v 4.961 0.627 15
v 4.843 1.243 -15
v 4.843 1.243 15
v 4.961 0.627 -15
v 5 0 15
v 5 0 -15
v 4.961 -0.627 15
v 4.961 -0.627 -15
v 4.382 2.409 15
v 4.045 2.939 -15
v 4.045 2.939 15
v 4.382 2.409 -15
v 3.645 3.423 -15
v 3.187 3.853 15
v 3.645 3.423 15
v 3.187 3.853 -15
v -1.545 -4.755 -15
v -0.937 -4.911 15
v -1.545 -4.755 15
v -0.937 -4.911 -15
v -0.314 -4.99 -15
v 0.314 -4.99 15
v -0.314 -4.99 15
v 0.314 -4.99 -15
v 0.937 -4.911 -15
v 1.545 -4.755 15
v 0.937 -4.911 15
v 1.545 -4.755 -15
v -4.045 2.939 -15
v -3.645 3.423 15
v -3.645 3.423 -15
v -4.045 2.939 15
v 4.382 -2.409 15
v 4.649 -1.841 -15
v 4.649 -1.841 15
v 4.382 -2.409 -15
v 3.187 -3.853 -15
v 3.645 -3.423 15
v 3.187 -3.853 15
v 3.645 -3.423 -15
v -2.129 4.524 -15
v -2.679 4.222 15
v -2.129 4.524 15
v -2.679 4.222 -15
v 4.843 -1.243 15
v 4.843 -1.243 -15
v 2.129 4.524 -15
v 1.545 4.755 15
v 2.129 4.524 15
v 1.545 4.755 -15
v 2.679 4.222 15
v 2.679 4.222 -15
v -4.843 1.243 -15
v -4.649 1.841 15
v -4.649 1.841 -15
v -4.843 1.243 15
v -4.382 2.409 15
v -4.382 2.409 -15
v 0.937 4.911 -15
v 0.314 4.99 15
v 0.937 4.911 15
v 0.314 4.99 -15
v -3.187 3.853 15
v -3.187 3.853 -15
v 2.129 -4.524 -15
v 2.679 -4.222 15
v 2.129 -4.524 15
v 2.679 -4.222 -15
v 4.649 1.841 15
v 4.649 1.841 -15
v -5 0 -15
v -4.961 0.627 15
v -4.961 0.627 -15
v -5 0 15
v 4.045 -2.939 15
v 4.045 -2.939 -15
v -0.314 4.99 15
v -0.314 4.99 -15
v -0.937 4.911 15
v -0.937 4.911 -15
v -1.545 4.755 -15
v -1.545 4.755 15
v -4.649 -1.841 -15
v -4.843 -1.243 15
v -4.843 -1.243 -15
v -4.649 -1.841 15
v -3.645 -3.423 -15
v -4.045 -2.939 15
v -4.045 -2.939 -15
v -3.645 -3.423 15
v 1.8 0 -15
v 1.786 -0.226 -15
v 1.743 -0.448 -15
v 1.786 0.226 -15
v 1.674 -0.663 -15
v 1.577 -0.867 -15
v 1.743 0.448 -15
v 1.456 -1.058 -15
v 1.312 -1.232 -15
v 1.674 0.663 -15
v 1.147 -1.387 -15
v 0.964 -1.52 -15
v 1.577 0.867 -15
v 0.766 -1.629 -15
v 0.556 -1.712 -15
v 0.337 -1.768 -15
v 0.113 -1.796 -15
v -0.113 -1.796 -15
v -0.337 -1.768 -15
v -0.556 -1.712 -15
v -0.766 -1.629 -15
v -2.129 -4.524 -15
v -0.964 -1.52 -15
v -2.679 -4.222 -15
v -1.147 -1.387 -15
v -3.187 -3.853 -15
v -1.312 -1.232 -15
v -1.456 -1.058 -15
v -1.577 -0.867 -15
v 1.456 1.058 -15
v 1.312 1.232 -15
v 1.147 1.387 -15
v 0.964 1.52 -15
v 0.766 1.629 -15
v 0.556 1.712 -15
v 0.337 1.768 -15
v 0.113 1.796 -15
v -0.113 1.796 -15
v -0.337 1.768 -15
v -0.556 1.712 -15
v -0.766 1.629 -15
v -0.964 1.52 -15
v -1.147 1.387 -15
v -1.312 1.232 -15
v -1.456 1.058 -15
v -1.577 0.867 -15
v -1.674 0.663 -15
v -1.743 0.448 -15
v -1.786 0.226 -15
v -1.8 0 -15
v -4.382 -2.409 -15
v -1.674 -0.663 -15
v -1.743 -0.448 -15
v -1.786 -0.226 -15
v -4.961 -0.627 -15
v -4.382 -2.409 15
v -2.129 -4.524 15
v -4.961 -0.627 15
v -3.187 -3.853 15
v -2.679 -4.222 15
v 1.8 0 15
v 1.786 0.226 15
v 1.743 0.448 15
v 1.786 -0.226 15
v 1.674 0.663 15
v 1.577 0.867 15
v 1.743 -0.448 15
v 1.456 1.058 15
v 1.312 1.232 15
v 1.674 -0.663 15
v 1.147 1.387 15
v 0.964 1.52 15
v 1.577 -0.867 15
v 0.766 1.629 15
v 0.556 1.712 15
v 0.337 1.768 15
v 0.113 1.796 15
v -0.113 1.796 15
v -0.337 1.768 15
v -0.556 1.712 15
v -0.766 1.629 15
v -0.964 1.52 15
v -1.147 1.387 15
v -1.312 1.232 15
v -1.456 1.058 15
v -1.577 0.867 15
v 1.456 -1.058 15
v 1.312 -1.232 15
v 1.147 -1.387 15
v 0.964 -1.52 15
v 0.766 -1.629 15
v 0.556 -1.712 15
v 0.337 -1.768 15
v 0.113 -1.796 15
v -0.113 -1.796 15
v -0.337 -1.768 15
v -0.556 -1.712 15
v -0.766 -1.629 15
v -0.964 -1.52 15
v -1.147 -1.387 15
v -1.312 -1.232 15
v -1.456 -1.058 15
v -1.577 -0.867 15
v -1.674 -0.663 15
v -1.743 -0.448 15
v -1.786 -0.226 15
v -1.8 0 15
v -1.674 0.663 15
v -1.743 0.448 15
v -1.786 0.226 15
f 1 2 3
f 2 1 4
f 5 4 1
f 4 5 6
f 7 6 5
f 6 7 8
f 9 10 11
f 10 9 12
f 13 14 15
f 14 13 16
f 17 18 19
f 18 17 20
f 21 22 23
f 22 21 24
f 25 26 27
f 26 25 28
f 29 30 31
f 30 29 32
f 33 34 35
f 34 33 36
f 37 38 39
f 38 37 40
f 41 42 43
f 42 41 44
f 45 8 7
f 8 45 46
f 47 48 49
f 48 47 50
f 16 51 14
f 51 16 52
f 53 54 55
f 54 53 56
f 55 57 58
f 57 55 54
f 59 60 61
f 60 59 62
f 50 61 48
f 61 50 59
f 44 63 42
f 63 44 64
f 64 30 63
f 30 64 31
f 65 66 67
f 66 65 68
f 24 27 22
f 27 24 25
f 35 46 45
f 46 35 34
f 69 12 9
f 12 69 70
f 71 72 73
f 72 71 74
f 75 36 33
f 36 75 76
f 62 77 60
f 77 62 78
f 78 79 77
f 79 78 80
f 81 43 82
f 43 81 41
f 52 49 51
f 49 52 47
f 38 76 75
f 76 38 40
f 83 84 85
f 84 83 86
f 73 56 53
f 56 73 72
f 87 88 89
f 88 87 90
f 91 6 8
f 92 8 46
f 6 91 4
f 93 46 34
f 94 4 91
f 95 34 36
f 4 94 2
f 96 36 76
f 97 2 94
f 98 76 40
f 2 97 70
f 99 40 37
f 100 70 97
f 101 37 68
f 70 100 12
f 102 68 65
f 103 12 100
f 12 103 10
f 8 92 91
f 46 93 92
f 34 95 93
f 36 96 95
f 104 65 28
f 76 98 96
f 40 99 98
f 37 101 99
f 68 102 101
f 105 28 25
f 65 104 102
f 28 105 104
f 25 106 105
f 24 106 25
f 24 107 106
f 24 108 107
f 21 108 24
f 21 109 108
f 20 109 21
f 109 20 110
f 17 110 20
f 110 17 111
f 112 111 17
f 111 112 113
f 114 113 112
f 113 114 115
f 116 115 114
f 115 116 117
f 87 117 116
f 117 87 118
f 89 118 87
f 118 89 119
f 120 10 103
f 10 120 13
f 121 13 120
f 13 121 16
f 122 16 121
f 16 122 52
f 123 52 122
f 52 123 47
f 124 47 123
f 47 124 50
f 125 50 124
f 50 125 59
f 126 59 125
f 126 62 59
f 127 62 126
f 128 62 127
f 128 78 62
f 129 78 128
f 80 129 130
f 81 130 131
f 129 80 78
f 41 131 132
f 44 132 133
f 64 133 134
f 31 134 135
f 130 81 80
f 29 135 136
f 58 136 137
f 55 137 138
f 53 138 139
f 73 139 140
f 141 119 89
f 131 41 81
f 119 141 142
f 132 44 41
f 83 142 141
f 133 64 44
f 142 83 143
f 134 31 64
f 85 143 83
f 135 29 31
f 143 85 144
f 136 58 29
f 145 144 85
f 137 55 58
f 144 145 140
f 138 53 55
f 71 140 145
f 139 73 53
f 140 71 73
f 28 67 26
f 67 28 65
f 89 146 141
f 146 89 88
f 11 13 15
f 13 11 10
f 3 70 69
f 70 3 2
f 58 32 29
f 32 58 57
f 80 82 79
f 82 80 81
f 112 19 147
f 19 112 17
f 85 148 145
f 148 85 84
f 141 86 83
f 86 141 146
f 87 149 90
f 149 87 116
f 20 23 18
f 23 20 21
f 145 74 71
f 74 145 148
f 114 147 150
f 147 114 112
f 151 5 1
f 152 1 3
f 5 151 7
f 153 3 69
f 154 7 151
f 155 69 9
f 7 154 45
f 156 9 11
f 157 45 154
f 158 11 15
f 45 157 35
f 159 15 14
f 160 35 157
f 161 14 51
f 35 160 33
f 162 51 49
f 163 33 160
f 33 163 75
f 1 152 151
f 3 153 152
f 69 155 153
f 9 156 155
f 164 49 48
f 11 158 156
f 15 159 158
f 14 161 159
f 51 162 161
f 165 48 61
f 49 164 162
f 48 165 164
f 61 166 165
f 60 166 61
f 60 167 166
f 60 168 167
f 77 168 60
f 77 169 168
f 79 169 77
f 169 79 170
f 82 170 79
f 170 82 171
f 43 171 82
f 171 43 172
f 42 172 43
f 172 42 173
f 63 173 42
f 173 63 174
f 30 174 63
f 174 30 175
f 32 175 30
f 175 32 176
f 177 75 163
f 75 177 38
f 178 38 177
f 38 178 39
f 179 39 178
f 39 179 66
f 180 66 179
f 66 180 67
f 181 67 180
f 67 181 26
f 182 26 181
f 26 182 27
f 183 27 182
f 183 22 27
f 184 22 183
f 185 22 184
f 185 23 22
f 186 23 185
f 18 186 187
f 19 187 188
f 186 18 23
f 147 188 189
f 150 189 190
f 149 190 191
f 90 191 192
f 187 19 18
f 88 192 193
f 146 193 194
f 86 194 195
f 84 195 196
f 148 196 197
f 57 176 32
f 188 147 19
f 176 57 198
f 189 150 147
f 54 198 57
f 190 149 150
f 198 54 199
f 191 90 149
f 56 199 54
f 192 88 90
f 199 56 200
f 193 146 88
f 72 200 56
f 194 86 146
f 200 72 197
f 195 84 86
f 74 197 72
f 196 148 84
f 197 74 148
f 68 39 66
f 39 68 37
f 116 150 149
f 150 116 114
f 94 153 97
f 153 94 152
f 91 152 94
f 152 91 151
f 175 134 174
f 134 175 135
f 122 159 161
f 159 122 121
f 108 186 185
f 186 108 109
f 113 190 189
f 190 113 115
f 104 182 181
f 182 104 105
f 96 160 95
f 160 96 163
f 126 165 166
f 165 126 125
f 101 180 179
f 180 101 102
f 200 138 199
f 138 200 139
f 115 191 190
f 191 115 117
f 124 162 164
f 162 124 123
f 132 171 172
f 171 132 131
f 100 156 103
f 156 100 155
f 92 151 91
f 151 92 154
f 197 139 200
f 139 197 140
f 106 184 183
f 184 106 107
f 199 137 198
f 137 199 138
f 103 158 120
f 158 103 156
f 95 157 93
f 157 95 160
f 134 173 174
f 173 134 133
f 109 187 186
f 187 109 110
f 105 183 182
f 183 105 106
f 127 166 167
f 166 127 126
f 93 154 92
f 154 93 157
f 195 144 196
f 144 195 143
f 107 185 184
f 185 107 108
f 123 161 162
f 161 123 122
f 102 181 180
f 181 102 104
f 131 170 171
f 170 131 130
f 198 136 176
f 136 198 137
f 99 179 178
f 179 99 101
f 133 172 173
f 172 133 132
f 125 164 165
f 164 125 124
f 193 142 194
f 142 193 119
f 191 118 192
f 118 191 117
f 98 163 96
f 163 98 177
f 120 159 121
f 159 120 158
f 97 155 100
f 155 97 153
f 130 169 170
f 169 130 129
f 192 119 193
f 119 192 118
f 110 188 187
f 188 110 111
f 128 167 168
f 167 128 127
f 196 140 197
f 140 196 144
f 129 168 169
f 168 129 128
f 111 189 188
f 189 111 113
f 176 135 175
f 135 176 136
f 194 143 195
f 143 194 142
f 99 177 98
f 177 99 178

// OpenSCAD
$fn = 50;


difference() {
	union() {
		translate(v = [0, 0, -15.0000000000]) {
			cylinder(h = 30, r = 5.0000000000);
		}
	}
	union() {
		#translate(v = [0, 0, -100.0000000000]) {
			cylinder(h = 200, r = 1.8000000000);
		}
	}
}
